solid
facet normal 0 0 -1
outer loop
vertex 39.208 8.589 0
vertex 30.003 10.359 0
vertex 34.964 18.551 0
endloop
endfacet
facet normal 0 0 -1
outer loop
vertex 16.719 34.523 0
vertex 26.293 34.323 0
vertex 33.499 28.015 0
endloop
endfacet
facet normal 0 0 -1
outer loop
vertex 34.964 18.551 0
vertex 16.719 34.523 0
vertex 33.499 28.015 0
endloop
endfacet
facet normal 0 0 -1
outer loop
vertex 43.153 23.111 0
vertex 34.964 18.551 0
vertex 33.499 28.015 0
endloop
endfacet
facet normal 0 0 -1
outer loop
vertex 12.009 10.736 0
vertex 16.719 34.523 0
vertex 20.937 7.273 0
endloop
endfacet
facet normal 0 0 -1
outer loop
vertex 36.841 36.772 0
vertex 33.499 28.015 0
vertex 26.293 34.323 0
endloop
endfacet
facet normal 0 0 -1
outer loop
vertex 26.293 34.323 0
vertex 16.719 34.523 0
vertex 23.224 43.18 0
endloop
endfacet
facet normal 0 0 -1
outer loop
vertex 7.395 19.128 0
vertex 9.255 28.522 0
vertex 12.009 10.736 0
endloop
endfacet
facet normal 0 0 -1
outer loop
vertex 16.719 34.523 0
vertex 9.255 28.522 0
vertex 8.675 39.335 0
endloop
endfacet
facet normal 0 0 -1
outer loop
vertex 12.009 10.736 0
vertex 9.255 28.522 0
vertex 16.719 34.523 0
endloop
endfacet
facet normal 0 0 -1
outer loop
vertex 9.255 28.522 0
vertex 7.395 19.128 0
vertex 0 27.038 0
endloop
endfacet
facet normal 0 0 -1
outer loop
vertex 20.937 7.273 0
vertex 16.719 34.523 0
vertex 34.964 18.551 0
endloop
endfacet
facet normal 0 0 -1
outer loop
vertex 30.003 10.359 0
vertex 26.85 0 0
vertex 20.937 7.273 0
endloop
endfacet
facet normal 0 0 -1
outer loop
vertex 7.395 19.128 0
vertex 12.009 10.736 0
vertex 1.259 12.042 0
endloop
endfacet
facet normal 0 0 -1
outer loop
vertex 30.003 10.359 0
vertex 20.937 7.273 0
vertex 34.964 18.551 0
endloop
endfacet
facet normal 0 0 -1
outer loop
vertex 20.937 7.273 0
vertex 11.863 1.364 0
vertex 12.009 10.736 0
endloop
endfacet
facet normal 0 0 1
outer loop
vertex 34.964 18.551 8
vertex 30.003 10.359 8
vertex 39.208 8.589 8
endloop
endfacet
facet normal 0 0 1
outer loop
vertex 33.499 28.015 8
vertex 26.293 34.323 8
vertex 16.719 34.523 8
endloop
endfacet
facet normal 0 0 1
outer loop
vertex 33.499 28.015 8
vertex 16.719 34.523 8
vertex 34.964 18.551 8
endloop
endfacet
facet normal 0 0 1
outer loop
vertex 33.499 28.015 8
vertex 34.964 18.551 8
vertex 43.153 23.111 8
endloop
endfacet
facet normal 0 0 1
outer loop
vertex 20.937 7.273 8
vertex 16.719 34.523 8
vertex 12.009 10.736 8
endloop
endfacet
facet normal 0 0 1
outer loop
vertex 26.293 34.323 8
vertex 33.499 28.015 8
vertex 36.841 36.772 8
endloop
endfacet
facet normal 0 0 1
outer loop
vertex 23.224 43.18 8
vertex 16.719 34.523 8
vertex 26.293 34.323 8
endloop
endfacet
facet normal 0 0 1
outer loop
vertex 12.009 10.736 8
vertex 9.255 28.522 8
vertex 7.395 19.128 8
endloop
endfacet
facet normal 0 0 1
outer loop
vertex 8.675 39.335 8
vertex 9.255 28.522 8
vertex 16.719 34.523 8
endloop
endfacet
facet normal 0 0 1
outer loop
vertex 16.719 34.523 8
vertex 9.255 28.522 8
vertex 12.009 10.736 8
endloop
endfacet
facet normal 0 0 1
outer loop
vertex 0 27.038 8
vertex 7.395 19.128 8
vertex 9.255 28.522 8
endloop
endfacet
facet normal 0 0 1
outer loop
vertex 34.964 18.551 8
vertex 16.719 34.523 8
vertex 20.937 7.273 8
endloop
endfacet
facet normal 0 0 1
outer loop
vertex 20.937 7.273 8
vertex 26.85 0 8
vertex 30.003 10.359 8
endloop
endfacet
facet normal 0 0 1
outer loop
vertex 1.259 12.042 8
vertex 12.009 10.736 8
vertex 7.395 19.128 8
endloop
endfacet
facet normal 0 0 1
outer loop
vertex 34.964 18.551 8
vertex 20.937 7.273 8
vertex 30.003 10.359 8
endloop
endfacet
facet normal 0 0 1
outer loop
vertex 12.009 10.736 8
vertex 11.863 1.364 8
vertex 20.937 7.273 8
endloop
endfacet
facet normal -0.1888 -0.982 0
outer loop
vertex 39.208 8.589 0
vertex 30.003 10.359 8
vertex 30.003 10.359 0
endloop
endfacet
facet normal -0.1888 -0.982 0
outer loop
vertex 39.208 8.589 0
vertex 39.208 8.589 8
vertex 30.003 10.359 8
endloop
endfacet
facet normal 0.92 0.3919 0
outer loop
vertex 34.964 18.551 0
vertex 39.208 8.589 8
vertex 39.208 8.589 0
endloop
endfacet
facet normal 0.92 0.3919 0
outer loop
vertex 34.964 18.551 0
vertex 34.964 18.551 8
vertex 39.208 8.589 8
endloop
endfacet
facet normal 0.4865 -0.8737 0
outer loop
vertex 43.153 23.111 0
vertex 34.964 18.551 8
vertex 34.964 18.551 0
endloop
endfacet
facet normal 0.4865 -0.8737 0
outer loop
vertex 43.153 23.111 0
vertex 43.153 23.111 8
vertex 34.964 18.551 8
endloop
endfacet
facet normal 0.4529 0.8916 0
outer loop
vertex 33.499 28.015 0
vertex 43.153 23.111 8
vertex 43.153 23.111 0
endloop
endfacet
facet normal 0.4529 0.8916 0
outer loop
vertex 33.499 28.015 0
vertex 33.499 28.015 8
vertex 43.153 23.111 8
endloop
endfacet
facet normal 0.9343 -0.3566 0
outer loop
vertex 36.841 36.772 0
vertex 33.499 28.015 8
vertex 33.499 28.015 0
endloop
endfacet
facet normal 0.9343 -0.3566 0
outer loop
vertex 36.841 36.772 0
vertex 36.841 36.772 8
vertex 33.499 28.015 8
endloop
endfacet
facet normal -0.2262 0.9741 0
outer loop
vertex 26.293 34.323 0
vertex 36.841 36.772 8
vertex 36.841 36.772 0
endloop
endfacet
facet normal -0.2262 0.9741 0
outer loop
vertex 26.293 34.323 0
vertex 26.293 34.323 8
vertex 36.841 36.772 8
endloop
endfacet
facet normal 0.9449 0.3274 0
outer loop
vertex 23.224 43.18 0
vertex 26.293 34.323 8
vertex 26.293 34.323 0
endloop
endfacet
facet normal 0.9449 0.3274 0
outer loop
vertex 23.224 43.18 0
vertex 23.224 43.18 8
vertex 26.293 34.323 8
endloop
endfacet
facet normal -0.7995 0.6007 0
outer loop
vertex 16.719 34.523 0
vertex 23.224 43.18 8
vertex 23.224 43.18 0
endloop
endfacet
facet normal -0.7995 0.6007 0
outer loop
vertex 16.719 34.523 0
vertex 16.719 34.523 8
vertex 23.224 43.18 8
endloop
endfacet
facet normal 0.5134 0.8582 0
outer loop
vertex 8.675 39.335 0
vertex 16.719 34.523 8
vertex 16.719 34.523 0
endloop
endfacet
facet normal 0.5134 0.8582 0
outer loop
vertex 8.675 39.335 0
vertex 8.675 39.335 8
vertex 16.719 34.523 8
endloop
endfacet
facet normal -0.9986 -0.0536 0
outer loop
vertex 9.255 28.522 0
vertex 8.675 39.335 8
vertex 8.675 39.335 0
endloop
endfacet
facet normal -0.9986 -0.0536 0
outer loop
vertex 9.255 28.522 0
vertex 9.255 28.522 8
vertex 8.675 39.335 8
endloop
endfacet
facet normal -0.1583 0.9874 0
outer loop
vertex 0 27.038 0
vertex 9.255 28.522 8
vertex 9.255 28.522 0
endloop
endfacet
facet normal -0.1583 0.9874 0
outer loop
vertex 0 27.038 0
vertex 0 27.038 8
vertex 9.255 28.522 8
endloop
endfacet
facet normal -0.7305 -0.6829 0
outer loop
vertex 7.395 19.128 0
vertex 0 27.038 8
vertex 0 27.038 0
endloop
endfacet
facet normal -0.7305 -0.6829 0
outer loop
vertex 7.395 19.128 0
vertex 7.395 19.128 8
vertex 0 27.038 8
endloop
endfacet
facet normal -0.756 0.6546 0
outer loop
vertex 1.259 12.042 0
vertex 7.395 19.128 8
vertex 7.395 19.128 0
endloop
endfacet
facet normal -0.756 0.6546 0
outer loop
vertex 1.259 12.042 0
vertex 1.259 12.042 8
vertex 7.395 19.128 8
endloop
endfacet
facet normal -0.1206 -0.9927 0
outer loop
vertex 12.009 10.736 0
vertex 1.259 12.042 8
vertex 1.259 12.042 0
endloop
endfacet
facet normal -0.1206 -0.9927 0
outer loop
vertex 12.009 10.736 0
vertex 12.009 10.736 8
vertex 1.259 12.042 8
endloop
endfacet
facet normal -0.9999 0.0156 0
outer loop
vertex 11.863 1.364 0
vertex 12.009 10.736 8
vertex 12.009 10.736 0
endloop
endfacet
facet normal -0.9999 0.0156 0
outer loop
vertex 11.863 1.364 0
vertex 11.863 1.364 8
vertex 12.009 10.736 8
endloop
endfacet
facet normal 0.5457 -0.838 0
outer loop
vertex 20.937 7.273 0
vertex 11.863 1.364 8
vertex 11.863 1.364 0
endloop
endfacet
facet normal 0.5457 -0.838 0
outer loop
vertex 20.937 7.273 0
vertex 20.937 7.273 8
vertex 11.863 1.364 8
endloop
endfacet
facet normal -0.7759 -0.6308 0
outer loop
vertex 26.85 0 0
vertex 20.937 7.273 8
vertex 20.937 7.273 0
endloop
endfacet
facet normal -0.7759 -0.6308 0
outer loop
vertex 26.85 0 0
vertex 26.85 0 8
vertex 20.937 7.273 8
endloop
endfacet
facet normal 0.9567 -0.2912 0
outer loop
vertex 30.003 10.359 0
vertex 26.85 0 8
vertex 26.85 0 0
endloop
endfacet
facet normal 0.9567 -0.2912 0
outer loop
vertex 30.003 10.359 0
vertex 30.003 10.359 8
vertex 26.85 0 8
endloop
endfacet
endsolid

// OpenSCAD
$fn = 32;

// ----------------------------------------------------------------------
// Chain sprocket: 9 teeth, 14 mm root radius
// ----------------------------------------------------------------------

// --- parameters (mm) ---
profile_height = 8;       // extrusion height
profile_points = 18;      // points of the closed outline

profile = [[34.964, 18.551], [43.153, 23.111], [33.499, 28.015], [36.841, 36.772], [26.293, 34.323], [23.224, 43.18], [16.719, 34.523], [8.675, 39.335], [9.255, 28.522], [0, 27.038], [7.395, 19.128], [1.259, 12.042], [12.009, 10.736], [11.863, 1.364], [20.937, 7.273], [26.85, 0], [30.003, 10.359], [39.208, 8.589]];  // single closed polygon, 18 points, counter clockwise

// --- the one profile operation ---
linear_extrude(height = profile_height) polygon(points = profile);
